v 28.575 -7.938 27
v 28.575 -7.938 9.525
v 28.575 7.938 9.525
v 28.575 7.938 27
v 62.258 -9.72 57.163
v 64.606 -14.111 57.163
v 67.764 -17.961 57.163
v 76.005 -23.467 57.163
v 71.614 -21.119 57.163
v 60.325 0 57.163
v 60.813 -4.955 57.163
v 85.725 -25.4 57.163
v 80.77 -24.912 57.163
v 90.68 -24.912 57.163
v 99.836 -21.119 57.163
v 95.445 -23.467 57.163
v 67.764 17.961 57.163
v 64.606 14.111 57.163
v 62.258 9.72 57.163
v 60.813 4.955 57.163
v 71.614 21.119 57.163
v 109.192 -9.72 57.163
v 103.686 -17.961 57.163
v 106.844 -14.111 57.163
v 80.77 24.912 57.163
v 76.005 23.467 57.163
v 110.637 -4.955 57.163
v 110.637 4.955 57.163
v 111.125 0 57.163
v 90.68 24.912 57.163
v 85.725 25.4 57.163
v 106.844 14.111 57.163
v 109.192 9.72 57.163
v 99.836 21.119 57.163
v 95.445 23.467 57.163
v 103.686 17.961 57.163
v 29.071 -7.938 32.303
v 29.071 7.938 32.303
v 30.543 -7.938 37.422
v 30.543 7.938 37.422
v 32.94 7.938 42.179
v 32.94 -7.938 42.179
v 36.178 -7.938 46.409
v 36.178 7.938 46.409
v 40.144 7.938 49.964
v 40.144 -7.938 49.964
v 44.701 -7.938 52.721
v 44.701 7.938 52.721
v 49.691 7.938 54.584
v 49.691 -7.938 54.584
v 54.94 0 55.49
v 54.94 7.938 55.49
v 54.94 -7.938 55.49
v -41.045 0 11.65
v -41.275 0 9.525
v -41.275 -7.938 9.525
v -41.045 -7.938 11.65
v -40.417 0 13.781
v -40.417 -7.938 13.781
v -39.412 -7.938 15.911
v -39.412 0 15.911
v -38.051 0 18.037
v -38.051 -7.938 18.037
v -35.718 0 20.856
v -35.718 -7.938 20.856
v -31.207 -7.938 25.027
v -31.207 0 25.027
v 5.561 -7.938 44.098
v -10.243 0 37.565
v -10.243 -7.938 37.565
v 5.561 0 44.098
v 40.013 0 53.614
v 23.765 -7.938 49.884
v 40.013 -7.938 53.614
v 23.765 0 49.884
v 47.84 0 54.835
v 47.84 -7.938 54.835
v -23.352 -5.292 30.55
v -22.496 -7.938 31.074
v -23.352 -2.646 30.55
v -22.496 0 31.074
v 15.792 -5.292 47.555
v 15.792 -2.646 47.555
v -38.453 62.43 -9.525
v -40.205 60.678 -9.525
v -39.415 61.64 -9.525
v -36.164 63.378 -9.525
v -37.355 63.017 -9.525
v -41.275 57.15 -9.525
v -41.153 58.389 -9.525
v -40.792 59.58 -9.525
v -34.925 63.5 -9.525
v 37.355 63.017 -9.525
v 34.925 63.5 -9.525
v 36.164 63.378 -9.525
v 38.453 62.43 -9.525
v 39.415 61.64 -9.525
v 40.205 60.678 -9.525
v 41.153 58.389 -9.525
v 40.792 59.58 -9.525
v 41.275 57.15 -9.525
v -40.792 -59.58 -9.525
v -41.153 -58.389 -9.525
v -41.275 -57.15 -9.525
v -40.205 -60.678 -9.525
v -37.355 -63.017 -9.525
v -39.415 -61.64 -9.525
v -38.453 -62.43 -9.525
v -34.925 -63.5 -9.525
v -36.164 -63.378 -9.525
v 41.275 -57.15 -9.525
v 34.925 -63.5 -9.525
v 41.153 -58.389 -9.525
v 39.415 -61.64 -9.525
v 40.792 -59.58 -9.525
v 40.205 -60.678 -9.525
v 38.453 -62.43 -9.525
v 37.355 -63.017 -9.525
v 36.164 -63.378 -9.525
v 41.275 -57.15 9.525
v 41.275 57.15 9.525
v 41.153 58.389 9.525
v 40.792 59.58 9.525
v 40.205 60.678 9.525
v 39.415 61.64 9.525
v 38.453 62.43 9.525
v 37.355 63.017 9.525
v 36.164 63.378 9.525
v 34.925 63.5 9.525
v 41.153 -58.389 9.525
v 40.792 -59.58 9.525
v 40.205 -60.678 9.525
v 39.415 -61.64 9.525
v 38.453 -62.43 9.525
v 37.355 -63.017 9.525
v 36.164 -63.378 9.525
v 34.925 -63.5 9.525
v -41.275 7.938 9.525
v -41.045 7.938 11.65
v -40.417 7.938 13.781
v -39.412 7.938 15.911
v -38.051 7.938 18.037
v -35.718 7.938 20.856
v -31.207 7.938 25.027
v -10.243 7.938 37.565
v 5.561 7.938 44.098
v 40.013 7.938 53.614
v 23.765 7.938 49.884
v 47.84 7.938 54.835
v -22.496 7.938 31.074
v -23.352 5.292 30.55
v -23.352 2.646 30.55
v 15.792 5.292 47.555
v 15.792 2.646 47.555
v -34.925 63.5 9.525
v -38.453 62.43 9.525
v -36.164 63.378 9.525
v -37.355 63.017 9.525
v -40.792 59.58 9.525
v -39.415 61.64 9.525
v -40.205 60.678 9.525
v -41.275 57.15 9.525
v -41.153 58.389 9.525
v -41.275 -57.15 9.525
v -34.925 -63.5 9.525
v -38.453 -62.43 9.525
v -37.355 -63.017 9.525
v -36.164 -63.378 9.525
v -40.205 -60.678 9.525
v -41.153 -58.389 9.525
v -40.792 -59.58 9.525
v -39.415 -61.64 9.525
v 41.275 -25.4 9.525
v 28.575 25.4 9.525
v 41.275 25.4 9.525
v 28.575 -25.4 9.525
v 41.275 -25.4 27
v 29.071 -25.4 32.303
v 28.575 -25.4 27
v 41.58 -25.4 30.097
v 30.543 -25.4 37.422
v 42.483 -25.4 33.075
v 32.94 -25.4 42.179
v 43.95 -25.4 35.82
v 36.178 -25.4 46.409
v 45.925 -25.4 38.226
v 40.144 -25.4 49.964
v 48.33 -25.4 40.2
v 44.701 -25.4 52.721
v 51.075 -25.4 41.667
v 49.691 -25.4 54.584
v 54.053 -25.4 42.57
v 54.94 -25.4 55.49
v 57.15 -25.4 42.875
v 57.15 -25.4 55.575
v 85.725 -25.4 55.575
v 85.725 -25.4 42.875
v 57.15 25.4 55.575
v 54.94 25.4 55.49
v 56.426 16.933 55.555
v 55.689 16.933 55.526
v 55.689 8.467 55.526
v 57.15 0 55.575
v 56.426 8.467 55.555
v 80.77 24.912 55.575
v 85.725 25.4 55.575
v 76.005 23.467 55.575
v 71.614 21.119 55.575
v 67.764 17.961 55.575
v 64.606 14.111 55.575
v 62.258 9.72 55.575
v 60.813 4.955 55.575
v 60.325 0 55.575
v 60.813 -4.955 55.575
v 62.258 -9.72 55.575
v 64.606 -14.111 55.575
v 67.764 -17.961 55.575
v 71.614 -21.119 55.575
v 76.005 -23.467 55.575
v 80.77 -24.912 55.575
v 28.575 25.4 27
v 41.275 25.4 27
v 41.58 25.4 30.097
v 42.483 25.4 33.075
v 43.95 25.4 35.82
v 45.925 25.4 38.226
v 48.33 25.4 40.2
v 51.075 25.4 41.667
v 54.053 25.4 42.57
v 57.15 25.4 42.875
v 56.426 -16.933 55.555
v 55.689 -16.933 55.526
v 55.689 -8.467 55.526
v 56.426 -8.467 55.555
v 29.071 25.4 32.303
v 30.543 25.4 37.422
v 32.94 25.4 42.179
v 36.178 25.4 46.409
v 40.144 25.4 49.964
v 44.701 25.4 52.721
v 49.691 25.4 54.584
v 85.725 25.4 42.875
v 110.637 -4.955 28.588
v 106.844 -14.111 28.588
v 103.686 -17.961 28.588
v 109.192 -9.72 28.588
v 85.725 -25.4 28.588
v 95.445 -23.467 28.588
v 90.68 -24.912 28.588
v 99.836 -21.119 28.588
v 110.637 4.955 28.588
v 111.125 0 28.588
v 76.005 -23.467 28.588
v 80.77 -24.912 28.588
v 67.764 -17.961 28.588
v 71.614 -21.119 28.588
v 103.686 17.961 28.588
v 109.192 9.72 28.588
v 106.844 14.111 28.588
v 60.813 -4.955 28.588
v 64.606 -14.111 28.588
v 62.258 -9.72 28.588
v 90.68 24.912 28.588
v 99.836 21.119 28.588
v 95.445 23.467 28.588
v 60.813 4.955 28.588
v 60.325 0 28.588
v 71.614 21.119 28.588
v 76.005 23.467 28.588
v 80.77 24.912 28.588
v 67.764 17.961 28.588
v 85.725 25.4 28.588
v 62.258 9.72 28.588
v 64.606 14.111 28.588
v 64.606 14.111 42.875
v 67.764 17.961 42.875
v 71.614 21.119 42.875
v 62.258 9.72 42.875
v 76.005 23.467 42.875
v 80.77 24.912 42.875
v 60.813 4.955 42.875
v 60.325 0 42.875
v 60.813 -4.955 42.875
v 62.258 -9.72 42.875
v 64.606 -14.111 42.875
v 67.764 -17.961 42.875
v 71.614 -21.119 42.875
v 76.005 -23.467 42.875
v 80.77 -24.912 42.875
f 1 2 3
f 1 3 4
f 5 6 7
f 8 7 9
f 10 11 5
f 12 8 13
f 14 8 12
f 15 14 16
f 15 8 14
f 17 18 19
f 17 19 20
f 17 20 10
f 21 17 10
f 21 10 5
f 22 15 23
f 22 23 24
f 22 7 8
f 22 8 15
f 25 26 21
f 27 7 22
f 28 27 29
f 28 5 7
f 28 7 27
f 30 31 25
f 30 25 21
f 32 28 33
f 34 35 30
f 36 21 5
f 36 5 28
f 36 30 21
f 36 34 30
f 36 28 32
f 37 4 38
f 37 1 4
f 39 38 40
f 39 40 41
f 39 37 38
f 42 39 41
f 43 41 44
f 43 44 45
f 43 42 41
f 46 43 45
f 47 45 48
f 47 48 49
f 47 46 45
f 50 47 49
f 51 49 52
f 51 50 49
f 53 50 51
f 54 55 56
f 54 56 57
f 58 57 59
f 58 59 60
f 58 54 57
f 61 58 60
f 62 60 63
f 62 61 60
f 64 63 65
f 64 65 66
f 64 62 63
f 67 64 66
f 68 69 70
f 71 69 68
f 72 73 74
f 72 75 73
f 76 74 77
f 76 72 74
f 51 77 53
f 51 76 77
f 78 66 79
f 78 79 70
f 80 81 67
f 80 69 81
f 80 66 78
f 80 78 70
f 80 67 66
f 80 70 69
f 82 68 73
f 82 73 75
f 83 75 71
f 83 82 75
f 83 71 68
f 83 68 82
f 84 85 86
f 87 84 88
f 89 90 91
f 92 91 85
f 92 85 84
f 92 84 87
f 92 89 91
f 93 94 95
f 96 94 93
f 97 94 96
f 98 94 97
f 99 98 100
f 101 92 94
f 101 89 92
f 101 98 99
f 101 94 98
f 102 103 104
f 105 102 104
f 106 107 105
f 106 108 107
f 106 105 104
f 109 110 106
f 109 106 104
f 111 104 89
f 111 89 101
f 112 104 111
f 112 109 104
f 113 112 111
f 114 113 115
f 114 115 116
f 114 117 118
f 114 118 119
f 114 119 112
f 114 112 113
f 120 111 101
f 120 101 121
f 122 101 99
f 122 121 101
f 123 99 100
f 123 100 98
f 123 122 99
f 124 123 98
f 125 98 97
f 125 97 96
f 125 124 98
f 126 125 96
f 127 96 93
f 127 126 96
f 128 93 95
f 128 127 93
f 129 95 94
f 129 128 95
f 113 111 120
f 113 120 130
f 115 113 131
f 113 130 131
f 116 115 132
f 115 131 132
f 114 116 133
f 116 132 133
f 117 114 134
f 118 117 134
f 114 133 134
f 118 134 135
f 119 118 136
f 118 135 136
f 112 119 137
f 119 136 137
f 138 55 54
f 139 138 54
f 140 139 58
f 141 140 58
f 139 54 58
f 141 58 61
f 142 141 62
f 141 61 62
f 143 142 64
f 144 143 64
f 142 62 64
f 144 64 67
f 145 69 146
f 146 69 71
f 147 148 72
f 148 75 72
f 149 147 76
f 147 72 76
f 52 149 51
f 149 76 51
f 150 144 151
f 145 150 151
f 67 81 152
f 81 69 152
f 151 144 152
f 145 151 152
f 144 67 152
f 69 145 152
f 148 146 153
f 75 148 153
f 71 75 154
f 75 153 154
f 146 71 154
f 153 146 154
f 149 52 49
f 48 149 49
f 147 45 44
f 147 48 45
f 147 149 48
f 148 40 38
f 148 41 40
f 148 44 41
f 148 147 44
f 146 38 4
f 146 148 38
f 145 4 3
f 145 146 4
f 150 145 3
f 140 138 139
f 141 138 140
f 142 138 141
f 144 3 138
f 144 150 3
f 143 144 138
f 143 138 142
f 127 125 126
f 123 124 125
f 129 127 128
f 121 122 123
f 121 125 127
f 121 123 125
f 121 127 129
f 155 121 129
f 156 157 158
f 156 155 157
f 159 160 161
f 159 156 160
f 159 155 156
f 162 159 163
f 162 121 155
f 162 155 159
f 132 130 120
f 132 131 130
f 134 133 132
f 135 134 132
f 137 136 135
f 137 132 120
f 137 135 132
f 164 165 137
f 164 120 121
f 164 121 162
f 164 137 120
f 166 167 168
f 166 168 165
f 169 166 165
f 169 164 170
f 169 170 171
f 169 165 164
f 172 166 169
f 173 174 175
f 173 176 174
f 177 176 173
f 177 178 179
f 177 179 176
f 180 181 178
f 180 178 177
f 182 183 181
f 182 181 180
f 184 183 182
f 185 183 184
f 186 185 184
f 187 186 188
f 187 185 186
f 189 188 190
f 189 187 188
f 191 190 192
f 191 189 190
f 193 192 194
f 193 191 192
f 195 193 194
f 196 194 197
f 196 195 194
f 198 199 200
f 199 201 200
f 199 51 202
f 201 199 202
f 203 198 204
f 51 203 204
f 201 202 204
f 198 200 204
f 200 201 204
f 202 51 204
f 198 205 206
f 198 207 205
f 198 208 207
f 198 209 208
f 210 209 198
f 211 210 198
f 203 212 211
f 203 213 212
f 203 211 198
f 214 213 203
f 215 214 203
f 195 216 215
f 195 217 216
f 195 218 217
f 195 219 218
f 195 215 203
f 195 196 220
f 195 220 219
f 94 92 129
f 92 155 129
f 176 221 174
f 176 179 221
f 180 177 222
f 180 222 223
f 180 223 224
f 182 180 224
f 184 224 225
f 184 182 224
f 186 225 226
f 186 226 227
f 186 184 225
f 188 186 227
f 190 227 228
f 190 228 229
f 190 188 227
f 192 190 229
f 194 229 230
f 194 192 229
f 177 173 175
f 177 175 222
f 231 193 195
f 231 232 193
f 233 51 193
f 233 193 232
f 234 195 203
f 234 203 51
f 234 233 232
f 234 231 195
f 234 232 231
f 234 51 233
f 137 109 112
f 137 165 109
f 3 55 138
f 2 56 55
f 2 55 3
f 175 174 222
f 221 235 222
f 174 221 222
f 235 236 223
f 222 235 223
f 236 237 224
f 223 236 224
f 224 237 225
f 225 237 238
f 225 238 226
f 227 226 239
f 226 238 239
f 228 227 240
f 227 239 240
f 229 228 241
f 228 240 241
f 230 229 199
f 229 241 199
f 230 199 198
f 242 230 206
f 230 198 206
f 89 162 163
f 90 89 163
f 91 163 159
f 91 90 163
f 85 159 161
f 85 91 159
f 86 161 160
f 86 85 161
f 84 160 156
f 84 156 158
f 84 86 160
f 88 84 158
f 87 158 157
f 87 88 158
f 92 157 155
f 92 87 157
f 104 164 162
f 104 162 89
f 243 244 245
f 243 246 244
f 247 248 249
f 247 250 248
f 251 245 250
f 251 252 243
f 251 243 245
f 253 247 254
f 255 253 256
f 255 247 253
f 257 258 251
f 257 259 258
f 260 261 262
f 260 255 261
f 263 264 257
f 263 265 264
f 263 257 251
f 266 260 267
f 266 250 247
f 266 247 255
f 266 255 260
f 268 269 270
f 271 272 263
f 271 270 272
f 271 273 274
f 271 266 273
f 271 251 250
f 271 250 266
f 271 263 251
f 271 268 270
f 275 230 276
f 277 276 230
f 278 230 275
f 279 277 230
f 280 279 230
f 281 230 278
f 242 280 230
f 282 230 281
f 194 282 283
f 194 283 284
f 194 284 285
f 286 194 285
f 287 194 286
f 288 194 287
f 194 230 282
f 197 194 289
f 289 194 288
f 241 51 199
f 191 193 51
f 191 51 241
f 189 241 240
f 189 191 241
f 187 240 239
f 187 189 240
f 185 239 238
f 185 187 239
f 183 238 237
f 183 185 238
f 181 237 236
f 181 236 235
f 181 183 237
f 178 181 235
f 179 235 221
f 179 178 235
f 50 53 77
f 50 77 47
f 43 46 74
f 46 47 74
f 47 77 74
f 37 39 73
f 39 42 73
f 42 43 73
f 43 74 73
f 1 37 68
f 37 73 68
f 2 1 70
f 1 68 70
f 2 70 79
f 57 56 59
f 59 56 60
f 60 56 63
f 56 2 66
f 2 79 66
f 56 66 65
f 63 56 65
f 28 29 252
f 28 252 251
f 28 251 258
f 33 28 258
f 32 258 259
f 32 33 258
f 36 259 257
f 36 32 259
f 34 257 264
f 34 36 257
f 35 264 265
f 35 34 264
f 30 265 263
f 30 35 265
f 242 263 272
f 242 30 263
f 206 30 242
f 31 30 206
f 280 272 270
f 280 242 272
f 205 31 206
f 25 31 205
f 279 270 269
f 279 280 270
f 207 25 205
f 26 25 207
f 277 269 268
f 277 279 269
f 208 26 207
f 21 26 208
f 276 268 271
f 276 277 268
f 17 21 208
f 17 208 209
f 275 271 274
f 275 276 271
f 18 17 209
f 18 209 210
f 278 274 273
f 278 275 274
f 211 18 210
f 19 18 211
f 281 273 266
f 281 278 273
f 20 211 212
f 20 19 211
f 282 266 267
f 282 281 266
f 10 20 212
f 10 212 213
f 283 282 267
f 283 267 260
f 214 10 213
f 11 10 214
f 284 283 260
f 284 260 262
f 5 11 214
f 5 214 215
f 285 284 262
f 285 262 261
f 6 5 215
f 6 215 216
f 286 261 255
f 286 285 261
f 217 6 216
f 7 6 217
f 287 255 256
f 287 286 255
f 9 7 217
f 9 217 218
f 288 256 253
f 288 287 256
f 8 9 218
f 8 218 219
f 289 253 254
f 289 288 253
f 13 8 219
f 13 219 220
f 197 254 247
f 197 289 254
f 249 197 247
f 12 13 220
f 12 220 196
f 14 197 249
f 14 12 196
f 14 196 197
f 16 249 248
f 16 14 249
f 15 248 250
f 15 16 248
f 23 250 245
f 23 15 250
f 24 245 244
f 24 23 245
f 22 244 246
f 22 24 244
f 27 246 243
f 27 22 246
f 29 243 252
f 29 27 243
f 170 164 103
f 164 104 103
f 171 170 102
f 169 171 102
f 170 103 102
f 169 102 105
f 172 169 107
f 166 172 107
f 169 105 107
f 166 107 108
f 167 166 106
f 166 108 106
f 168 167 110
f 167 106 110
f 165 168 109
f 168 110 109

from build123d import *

# Parameters (mm, degrees)
F1_DEPTH = 63.5
F0_W     = 25.4
F0_H     = 12.7
F2_DEPTH = 25.4
F3_DEPTH = 7.9375
F5_R     = 6.35


with BuildPart() as f1:
    # F0 (on Front) → F1 (new body, symmetric)
    with BuildSketch(Plane.XZ):
        Polygon((-41.275, 9.525), (-41.275, -9.525), (41.275, -9.525), (41.275, 9.525), (28.575, 9.525), align=None)
    extrude(amount=F1_DEPTH, both=True)

    # F5
    f5_edges = [f1.edges().sort_by_distance(p)[0] for p in [
        (41.275, -63.5, 0),
        (-41.275, -63.5, 0),
        (41.275, 63.5, 0),
        (-41.275, 63.5, 0),
    ]]
    fillet(f5_edges, radius=F5_R)


with BuildPart() as f2:
    # F0 (on Front) → F2 (new body, symmetric)
    with BuildSketch(Plane.XZ):
        with BuildLine():
            Line((28.575, 9.525), (41.275, 9.525))
            Line((41.275, 9.525), (41.275, 27.0002))
            ThreePointArc((41.275, 27.0002), (45.9246798487, 38.2255201513), (57.15, 42.8752))
            Line((57.15, 42.8752), (60.325, 42.8752))
            Line((60.325, 42.8752), (60.325, 55.5752))
            Line((60.325, 55.5752), (57.15, 55.5752))
            add(Edge.make_bspline(
                [(54.9398971504, 55.4896027736), (55.6946241819, 55.5299590665), (56.431739579, 55.5585901401), (57.15, 55.5752)],
                knots=[106.1672440771, 106.1672440771, 106.1672440771, 106.1672440771, 108.6650888972, 108.6650888972, 108.6650888972, 108.6650888972], degree=3))
            ThreePointArc((54.9398971504, 55.4896027736), (36.1775858098, 46.4086638247), (28.575, 27.0002))
            Line((28.575, 27.0002), (28.575, 9.525))
        make_face()
        with Locations((73.025, 49.2252)):
            Rectangle(F0_W, F0_H)
    extrude(amount=F2_DEPTH, both=True)

    # F0 (on Front) → F4 (revolve)
    with BuildSketch(Plane.XZ):
        Polygon((85.725, 57.1627), (85.725, 55.5752), (85.725, 42.8752), (85.725, 28.5877), (111.125, 28.5877), (111.125, 57.1627), align=None)
    revolve(axis=Axis((85.725, 0, 42.8752), (0, 0, 1)))


with BuildPart() as f3:
    # F0 (on Front) → F3 (new body, symmetric)
    with BuildSketch(Plane.XZ):
        with BuildLine():
            add(Edge.make_bspline(
                [(-41.275, 9.525), (-41.0335543555, 30.8768277723), (22.8613275304, 53.7743175127), (54.9398971504, 55.4896027736)],
                knots=[0, 0, 0, 0, 106.1672440771, 106.1672440771, 106.1672440771, 106.1672440771], degree=3))
            Line((-41.275, 9.525), (28.575, 9.525))
            Line((28.575, 9.525), (28.575, 27.0002))
            ThreePointArc((28.575, 27.0002), (36.1775858098, 46.4086638247), (54.9398971504, 55.4896027736))
        make_face()
    extrude(amount=F3_DEPTH, both=True)


solid = Compound([f1.part, f2.part, f3.part])
